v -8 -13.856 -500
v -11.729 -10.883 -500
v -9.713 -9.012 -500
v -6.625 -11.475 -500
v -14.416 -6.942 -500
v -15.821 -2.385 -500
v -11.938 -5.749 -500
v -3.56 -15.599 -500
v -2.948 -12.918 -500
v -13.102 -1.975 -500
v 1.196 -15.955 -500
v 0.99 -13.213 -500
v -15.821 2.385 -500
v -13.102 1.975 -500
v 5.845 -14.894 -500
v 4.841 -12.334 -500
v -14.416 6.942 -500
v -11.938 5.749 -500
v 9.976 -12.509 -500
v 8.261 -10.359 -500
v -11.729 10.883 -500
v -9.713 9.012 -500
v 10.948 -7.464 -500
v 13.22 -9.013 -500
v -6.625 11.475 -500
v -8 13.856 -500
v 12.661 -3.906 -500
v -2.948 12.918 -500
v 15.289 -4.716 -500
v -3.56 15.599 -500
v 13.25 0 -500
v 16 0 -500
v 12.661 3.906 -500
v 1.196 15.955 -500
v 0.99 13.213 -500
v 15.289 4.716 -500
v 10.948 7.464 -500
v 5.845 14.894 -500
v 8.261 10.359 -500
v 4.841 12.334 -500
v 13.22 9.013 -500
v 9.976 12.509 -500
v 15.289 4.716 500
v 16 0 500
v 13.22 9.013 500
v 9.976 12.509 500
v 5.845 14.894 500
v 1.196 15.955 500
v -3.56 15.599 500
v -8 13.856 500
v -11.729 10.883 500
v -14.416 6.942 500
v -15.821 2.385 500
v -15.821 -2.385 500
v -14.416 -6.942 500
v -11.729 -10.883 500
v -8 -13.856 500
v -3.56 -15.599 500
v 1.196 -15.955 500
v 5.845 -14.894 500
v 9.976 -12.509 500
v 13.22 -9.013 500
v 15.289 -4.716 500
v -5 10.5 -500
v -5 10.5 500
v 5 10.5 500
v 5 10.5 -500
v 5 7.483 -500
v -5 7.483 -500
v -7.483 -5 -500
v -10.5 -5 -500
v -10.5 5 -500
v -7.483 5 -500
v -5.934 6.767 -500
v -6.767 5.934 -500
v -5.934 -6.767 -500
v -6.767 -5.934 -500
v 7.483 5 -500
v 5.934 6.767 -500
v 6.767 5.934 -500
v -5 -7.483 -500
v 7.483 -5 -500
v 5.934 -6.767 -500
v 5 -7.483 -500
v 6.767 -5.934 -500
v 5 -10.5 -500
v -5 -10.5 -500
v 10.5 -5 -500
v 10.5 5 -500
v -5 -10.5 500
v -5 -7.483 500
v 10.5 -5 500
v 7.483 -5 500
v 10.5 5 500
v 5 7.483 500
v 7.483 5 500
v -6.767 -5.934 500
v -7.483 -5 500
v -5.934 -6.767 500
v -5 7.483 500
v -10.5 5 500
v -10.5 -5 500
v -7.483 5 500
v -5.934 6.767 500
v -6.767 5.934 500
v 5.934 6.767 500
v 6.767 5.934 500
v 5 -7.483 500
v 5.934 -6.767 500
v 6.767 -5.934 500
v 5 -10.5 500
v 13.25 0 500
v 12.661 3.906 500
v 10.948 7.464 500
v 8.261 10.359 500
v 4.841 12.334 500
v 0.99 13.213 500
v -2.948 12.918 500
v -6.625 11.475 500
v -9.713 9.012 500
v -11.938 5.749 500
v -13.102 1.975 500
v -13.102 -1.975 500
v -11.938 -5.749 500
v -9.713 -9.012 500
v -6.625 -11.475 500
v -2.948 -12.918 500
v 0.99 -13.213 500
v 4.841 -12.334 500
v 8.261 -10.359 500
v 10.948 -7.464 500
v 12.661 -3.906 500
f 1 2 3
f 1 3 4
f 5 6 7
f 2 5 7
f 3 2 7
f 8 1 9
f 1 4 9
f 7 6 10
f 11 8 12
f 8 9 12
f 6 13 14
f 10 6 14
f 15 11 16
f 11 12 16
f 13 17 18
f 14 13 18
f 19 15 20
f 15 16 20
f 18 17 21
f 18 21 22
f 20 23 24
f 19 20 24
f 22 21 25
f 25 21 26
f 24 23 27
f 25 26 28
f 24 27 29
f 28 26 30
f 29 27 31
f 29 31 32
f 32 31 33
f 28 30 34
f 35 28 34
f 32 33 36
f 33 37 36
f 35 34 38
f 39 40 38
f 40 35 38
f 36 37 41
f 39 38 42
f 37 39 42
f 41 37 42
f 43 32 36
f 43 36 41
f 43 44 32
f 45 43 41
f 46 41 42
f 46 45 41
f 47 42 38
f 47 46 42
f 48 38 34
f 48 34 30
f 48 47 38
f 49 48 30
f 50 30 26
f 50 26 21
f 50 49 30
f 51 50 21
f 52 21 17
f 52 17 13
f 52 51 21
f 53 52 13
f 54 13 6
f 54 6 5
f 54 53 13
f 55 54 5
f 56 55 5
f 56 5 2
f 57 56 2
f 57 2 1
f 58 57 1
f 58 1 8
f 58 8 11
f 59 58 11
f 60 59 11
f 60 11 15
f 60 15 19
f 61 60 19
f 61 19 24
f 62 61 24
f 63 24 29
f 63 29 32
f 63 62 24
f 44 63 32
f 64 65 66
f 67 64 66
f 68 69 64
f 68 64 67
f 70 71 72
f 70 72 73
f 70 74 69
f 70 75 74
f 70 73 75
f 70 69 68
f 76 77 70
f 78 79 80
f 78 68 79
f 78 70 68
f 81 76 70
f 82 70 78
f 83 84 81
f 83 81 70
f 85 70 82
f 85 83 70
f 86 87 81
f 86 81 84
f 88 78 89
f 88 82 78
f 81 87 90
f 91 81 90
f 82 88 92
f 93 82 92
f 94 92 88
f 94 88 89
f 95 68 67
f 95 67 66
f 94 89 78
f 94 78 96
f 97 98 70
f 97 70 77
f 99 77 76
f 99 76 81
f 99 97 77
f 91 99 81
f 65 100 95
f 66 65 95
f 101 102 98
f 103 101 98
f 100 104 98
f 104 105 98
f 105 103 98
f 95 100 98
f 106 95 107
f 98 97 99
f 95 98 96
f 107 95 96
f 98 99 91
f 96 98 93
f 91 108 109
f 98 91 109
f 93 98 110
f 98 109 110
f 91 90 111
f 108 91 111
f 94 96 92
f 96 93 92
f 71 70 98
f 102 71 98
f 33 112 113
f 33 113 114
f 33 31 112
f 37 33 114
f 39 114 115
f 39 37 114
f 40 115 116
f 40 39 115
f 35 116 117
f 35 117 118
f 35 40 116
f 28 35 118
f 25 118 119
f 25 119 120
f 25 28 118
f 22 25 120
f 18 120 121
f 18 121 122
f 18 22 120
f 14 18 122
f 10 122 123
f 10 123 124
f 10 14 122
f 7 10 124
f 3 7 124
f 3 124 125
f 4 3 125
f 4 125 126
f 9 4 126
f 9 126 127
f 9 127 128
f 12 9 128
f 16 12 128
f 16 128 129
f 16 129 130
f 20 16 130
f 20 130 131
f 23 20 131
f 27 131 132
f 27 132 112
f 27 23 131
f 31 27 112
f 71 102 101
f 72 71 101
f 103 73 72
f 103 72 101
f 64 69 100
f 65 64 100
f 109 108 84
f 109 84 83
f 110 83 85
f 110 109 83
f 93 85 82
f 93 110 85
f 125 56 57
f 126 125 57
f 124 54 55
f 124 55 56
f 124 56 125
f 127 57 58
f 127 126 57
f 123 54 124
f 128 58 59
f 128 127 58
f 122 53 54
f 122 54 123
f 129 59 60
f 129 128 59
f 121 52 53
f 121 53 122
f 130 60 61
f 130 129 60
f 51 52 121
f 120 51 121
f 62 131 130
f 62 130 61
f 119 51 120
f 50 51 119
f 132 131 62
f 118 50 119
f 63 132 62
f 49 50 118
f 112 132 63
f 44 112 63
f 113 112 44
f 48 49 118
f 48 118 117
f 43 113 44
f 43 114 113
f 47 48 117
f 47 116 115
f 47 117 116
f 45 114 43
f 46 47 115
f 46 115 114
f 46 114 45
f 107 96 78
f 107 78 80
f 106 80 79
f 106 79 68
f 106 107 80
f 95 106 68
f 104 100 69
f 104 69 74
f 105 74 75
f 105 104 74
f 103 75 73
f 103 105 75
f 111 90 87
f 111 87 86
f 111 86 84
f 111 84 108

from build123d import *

# Parameters (mm, degrees)
F0_R     = 9
F1_DEPTH = 500
F3_W     = 10
F3_H     = 1000
F4_DEPTH = 10.5
F5_W     = 10
F5_H     = 1000
F6_DEPTH = 10.5
F7_R     = 16
F7_R_2   = 13.25
F8_DEPTH = 500


with BuildPart() as f1:
    # F0 (on Top) → F1 (new body, symmetric)
    with BuildSketch(Plane.XY):
        Circle(F0_R)
    extrude(amount=F1_DEPTH, both=True)

    # F3 (on Right) → F4 (join, symmetric)
    with BuildSketch(Plane.YZ):
        Rectangle(F3_W, F3_H)
    extrude(amount=F4_DEPTH, both=True)

    # F5 (on Front) → F6 (join, symmetric)
    with BuildSketch(Plane.XZ):
        Rectangle(F5_W, F5_H)
    extrude(amount=F6_DEPTH, both=True)


with BuildPart() as f8:
    # F7 (on Top) → F8 (new body, symmetric)
    with BuildSketch(Plane.XY):
        Circle(F7_R)
        Circle(F7_R_2, mode=Mode.SUBTRACT)
    extrude(amount=F8_DEPTH, both=True)


with BuildPart() as f9_1:
    # F9: copy of F1
    add(f1.part.moved(Location((57, 0, 0))))


solid = Compound([f1.part, f8.part])
